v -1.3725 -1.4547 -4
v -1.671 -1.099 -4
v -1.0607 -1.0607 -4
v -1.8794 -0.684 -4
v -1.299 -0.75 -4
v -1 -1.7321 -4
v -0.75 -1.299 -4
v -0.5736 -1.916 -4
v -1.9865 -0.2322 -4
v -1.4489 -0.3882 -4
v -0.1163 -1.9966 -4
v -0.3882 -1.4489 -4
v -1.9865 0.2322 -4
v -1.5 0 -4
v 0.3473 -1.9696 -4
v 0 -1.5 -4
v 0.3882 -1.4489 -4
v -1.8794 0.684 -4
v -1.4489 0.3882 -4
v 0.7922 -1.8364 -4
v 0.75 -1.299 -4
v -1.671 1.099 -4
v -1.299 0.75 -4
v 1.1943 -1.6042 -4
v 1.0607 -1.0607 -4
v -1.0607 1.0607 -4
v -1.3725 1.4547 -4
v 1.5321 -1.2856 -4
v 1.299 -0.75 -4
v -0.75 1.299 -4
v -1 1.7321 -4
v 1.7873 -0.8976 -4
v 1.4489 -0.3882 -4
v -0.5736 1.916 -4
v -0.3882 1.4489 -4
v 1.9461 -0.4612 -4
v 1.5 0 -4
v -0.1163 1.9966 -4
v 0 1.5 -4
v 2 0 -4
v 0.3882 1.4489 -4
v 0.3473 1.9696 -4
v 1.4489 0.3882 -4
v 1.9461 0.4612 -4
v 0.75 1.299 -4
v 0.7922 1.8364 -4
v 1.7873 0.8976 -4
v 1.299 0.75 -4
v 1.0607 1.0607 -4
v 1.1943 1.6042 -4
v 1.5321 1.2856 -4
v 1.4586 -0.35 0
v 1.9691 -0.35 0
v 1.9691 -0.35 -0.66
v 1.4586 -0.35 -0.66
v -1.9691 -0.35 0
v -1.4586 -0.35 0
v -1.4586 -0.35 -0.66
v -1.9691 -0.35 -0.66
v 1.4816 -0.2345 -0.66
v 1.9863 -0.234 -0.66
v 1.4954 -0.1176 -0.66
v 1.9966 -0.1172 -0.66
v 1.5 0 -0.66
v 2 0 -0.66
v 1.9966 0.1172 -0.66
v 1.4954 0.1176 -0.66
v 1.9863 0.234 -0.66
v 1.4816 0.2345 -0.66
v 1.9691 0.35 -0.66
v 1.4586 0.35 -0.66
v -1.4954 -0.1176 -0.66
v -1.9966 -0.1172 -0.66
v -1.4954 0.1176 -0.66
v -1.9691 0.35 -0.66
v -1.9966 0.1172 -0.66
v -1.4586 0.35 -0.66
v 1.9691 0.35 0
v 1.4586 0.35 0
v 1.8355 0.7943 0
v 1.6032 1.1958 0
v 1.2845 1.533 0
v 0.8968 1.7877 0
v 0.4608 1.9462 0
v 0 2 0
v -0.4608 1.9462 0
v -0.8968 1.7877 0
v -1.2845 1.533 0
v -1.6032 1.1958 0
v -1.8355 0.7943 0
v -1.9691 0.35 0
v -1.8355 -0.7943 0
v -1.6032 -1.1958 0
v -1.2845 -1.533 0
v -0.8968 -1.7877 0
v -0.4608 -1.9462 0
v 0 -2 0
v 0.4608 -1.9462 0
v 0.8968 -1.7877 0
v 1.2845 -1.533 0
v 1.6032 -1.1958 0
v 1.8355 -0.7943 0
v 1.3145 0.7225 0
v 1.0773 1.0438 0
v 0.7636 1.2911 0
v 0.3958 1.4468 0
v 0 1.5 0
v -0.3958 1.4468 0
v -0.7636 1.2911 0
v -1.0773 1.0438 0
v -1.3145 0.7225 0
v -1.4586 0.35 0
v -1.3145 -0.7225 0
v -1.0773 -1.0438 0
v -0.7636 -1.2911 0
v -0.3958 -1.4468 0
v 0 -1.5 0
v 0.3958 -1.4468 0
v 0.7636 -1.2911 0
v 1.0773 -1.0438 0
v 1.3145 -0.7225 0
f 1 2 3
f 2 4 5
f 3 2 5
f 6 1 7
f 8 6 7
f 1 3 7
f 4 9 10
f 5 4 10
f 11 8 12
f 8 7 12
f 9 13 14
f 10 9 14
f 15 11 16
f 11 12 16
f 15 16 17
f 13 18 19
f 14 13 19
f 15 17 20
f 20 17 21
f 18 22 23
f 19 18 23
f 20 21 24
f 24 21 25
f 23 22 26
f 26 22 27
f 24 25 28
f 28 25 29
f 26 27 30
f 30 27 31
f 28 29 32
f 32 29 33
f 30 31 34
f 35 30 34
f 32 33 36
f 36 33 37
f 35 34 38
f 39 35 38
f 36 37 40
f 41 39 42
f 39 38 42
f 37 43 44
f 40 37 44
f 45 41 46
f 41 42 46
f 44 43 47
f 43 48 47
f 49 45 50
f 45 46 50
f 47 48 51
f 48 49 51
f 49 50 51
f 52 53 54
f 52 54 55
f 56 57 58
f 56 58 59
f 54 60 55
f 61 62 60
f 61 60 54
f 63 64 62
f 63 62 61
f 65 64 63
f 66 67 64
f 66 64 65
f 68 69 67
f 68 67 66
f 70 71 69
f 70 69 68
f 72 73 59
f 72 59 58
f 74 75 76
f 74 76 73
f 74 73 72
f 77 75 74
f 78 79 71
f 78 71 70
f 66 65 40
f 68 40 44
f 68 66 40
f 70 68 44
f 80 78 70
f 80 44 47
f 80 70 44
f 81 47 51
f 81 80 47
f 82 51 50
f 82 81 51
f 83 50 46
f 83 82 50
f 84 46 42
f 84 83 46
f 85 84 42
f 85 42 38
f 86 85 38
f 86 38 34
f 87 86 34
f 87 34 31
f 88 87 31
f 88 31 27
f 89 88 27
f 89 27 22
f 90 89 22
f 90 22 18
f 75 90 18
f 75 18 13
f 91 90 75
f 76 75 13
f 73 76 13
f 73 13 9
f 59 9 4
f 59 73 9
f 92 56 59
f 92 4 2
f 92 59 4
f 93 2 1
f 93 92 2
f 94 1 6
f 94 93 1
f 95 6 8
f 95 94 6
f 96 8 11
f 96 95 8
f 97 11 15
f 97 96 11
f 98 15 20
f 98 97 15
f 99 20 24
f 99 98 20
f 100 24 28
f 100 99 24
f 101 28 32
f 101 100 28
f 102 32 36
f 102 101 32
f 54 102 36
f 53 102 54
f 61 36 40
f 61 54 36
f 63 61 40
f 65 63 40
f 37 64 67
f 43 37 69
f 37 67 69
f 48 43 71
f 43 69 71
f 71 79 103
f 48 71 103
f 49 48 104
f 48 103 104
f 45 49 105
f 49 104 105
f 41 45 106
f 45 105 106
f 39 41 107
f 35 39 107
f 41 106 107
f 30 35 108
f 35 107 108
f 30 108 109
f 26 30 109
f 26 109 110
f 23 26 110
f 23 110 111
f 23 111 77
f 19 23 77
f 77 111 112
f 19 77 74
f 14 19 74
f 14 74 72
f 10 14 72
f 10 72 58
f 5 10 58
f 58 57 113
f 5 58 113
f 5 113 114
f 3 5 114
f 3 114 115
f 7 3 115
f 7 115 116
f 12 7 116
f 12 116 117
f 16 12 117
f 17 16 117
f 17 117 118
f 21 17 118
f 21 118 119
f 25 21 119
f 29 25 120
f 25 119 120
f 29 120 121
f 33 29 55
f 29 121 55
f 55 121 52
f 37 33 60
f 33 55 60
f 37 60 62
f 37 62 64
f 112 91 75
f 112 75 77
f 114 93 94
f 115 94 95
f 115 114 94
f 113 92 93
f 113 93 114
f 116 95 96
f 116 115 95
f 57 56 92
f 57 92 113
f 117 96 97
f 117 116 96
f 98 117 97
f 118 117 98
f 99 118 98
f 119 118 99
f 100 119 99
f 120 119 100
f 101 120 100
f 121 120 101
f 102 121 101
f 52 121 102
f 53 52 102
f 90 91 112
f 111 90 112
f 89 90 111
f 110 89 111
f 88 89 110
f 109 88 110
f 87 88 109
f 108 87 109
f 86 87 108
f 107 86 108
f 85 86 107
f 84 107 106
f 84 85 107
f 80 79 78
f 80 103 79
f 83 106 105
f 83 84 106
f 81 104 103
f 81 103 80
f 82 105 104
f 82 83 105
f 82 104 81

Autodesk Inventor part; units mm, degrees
ref_plane "YZ Plane" through (0, 0, 0) normal (1, 0, 0) x (0, 1, 0)
ref_plane "XZ Plane" through (0, 0, 0) normal (0, 1, 0) x (-1, 0, 0)
ref_plane "XY Plane" through (0, 0, 0) normal (0, 0, 1) x (1, 0, 0)
sketch "スケッチ1" plane through (0, 0, 0) normal (0, 0, 1) x (1, 0, 0)
  circle A0 centre (0, 0) radius 2
  circle A1 centre (0, 0) radius 1.5
  line L0 (-2, 0.35) -> (2, 0.35)
  line L1 (2, 0.35) -> (2, -0.35)
  line L2 (2, -0.35) -> (-2, -0.35)
  line L3 (-2, -0.35) -> (-2, 0.35)
  line L4 (-2, 0.35) -> (2, -0.35) construction
  line L5 (2, 0.35) -> (-2, -0.35) construction
  point P0 (1.4586, -0.35)
  point P1 (1.9691, -0.35)
  point P2 (1.9691, 0.35)
  point P3 (1.4586, 0.35)
  point P4 (-1.9691, -0.35)
  point P5 (-1.4586, -0.35)
  point P6 (-1.4586, 0.35)
  point P7 (-1.9691, 0.35)
  dimension "d0" = 4
  dimension "d1" = 3
  dimension "d8" = 0.7
extrude "押し出し1" add sketch "スケッチ1" against normal blind 4 contours A0 L2 A1 L0 | L0 A1 A0 | A0 L2 A1 | L0 A1 L2 A0
thread "ねじ1"
thread "ねじ2"
extrude "押し出し2" cut sketch "スケッチ1" against normal blind 0.66 contours A0 L2 A1 L0 | L0 A1 L2 A0
properties part number "IRU-304SW" material "ステンレス鋼 AISI 304"
